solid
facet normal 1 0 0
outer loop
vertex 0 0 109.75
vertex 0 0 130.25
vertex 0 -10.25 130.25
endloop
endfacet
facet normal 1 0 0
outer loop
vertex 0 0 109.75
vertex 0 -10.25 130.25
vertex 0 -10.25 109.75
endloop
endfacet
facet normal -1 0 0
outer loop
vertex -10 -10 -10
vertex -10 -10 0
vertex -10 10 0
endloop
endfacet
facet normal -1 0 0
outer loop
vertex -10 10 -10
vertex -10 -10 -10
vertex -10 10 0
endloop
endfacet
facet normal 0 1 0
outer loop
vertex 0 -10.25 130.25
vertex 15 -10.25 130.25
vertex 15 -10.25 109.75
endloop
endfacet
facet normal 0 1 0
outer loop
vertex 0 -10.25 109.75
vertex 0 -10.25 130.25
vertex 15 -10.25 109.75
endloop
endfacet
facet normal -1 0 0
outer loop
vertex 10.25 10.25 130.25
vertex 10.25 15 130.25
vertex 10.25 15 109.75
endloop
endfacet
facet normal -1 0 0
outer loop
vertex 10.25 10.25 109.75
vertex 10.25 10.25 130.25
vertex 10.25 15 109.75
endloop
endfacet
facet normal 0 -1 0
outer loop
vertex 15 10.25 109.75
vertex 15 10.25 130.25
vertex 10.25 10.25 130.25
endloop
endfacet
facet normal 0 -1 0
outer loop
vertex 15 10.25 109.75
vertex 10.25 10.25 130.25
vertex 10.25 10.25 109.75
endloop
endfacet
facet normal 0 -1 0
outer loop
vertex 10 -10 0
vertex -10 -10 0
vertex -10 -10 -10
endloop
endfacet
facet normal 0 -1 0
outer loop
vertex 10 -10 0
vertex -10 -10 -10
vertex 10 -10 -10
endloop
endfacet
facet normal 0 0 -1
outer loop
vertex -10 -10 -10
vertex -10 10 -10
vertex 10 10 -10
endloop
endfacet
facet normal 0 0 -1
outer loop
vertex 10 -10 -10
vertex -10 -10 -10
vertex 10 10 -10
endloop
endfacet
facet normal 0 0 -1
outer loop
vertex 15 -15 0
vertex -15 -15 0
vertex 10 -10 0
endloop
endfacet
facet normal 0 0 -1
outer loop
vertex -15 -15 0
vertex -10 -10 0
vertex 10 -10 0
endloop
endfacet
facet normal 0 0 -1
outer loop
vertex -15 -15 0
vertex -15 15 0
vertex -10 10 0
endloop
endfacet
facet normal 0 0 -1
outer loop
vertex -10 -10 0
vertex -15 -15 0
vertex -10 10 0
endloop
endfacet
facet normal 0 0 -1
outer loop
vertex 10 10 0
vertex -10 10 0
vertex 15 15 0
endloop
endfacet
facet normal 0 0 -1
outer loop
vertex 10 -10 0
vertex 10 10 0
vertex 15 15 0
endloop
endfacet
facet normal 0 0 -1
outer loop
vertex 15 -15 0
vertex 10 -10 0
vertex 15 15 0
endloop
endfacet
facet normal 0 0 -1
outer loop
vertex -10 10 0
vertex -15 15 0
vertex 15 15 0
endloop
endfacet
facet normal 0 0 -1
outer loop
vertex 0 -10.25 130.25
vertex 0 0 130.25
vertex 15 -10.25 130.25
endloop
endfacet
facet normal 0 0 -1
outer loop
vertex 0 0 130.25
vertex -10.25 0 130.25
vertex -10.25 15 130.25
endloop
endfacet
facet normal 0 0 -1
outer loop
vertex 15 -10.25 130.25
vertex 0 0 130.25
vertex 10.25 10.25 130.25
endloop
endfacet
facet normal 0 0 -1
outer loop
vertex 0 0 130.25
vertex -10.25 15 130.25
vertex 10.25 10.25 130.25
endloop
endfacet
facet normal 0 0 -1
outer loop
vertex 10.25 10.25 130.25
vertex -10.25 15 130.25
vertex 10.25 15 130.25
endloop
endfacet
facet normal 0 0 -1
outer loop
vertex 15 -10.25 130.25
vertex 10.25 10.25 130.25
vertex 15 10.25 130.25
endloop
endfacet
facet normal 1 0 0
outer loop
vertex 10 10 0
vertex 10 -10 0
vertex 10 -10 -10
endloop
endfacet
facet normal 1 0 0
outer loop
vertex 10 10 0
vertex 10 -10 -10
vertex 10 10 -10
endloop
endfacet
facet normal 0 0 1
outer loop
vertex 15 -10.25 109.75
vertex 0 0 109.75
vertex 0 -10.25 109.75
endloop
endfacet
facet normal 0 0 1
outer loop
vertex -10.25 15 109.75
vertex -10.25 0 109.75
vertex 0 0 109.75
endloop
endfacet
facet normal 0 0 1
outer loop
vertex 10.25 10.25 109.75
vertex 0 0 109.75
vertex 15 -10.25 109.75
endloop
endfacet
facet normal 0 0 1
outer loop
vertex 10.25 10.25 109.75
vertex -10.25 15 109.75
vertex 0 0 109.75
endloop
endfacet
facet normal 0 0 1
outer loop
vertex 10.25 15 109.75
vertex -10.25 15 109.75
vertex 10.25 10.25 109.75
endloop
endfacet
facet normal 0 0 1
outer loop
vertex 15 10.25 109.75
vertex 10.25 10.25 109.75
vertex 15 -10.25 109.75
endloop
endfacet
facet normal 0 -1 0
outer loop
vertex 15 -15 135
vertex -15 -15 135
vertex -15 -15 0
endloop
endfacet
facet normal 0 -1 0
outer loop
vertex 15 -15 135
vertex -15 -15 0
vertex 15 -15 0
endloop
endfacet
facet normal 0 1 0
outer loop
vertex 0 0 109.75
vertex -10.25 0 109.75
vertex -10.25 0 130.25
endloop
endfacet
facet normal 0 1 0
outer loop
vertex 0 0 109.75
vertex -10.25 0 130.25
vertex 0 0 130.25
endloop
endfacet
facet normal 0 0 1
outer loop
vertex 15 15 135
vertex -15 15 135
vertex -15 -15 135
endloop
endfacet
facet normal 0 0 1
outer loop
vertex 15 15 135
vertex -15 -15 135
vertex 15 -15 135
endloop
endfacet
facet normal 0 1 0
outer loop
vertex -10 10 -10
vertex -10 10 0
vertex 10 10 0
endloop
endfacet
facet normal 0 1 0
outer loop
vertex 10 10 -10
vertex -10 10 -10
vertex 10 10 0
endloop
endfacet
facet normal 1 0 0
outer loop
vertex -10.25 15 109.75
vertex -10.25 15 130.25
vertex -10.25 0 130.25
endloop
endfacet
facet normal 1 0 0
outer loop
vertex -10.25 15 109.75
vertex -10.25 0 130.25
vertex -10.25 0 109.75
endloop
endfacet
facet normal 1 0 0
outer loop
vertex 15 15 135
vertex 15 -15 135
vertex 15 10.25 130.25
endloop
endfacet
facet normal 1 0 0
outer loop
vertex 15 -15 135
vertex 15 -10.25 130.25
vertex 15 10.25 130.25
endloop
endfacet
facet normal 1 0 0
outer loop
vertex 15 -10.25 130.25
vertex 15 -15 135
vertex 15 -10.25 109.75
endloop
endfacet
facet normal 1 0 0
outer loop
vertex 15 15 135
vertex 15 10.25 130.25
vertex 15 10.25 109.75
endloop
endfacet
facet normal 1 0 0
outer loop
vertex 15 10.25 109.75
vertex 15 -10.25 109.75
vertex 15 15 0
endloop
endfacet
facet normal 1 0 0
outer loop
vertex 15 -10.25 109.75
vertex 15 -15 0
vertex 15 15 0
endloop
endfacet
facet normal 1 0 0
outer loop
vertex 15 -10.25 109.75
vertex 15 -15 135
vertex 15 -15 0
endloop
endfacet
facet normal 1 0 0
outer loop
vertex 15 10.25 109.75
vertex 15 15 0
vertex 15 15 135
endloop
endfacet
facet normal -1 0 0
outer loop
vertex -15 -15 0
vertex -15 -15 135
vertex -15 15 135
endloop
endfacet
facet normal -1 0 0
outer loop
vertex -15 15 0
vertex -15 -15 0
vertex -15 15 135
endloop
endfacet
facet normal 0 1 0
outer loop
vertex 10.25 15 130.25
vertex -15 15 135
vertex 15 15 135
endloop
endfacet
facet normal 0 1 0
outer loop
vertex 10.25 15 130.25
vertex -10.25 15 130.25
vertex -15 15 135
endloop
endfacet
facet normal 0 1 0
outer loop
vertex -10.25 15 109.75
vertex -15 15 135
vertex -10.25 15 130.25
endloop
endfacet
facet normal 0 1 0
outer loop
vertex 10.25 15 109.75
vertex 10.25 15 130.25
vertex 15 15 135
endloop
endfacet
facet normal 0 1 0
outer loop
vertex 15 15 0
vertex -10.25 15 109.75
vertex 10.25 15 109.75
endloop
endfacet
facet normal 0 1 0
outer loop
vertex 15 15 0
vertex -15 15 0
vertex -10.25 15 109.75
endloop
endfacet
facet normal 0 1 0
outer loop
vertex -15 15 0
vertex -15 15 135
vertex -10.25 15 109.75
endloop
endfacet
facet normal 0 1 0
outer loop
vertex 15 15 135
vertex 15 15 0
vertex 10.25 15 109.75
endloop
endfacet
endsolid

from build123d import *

# Parameters (mm, degrees)
SKETCH1_W           = 30
SKETCH1_H           = 30
BOSS_EXTRUDE1_DEPTH = 135
SKETCH2_W           = 20
SKETCH2_H           = 20
BOSS_EXTRUDE2_DEPTH = 10
SKETCH3_W           = 20.5
SKETCH3_H           = 20.5
CUT_EXTRUDE1_DEPTH  = 15
SKETCH4_W           = 20.5
SKETCH4_H           = 20.5
CUT_EXTRUDE2_DEPTH  = 15


with BuildPart() as part:
    # Sketch1 → Boss-Extrude1 (new body)
    with BuildSketch(Plane.XY):
        Rectangle(SKETCH1_W, SKETCH1_H)
    extrude(amount=BOSS_EXTRUDE1_DEPTH)

    # Sketch2 → Boss-Extrude2 (add)
    with BuildSketch(Plane.XY):
        Rectangle(SKETCH2_W, SKETCH2_H)
    extrude(amount=-BOSS_EXTRUDE2_DEPTH)

    # Sketch3 → Cut-Extrude1 (cut)
    with BuildSketch(Plane(origin=(15, 0, 0), x_dir=(0, 0, -1), z_dir=(1, 0, 0))):
        with Locations((-120, 0)):
            Rectangle(SKETCH3_W, SKETCH3_H)
    extrude(amount=-CUT_EXTRUDE1_DEPTH, mode=Mode.SUBTRACT)

    # Sketch4 → Cut-Extrude2 (cut)
    with BuildSketch(Plane(origin=(0, 15, 0), x_dir=(1, 0, 0), z_dir=(0, 1, 0))):
        with Locations((0, -120)):
            Rectangle(SKETCH4_W, SKETCH4_H)
    extrude(amount=-CUT_EXTRUDE2_DEPTH, mode=Mode.SUBTRACT)


solid = part.part
